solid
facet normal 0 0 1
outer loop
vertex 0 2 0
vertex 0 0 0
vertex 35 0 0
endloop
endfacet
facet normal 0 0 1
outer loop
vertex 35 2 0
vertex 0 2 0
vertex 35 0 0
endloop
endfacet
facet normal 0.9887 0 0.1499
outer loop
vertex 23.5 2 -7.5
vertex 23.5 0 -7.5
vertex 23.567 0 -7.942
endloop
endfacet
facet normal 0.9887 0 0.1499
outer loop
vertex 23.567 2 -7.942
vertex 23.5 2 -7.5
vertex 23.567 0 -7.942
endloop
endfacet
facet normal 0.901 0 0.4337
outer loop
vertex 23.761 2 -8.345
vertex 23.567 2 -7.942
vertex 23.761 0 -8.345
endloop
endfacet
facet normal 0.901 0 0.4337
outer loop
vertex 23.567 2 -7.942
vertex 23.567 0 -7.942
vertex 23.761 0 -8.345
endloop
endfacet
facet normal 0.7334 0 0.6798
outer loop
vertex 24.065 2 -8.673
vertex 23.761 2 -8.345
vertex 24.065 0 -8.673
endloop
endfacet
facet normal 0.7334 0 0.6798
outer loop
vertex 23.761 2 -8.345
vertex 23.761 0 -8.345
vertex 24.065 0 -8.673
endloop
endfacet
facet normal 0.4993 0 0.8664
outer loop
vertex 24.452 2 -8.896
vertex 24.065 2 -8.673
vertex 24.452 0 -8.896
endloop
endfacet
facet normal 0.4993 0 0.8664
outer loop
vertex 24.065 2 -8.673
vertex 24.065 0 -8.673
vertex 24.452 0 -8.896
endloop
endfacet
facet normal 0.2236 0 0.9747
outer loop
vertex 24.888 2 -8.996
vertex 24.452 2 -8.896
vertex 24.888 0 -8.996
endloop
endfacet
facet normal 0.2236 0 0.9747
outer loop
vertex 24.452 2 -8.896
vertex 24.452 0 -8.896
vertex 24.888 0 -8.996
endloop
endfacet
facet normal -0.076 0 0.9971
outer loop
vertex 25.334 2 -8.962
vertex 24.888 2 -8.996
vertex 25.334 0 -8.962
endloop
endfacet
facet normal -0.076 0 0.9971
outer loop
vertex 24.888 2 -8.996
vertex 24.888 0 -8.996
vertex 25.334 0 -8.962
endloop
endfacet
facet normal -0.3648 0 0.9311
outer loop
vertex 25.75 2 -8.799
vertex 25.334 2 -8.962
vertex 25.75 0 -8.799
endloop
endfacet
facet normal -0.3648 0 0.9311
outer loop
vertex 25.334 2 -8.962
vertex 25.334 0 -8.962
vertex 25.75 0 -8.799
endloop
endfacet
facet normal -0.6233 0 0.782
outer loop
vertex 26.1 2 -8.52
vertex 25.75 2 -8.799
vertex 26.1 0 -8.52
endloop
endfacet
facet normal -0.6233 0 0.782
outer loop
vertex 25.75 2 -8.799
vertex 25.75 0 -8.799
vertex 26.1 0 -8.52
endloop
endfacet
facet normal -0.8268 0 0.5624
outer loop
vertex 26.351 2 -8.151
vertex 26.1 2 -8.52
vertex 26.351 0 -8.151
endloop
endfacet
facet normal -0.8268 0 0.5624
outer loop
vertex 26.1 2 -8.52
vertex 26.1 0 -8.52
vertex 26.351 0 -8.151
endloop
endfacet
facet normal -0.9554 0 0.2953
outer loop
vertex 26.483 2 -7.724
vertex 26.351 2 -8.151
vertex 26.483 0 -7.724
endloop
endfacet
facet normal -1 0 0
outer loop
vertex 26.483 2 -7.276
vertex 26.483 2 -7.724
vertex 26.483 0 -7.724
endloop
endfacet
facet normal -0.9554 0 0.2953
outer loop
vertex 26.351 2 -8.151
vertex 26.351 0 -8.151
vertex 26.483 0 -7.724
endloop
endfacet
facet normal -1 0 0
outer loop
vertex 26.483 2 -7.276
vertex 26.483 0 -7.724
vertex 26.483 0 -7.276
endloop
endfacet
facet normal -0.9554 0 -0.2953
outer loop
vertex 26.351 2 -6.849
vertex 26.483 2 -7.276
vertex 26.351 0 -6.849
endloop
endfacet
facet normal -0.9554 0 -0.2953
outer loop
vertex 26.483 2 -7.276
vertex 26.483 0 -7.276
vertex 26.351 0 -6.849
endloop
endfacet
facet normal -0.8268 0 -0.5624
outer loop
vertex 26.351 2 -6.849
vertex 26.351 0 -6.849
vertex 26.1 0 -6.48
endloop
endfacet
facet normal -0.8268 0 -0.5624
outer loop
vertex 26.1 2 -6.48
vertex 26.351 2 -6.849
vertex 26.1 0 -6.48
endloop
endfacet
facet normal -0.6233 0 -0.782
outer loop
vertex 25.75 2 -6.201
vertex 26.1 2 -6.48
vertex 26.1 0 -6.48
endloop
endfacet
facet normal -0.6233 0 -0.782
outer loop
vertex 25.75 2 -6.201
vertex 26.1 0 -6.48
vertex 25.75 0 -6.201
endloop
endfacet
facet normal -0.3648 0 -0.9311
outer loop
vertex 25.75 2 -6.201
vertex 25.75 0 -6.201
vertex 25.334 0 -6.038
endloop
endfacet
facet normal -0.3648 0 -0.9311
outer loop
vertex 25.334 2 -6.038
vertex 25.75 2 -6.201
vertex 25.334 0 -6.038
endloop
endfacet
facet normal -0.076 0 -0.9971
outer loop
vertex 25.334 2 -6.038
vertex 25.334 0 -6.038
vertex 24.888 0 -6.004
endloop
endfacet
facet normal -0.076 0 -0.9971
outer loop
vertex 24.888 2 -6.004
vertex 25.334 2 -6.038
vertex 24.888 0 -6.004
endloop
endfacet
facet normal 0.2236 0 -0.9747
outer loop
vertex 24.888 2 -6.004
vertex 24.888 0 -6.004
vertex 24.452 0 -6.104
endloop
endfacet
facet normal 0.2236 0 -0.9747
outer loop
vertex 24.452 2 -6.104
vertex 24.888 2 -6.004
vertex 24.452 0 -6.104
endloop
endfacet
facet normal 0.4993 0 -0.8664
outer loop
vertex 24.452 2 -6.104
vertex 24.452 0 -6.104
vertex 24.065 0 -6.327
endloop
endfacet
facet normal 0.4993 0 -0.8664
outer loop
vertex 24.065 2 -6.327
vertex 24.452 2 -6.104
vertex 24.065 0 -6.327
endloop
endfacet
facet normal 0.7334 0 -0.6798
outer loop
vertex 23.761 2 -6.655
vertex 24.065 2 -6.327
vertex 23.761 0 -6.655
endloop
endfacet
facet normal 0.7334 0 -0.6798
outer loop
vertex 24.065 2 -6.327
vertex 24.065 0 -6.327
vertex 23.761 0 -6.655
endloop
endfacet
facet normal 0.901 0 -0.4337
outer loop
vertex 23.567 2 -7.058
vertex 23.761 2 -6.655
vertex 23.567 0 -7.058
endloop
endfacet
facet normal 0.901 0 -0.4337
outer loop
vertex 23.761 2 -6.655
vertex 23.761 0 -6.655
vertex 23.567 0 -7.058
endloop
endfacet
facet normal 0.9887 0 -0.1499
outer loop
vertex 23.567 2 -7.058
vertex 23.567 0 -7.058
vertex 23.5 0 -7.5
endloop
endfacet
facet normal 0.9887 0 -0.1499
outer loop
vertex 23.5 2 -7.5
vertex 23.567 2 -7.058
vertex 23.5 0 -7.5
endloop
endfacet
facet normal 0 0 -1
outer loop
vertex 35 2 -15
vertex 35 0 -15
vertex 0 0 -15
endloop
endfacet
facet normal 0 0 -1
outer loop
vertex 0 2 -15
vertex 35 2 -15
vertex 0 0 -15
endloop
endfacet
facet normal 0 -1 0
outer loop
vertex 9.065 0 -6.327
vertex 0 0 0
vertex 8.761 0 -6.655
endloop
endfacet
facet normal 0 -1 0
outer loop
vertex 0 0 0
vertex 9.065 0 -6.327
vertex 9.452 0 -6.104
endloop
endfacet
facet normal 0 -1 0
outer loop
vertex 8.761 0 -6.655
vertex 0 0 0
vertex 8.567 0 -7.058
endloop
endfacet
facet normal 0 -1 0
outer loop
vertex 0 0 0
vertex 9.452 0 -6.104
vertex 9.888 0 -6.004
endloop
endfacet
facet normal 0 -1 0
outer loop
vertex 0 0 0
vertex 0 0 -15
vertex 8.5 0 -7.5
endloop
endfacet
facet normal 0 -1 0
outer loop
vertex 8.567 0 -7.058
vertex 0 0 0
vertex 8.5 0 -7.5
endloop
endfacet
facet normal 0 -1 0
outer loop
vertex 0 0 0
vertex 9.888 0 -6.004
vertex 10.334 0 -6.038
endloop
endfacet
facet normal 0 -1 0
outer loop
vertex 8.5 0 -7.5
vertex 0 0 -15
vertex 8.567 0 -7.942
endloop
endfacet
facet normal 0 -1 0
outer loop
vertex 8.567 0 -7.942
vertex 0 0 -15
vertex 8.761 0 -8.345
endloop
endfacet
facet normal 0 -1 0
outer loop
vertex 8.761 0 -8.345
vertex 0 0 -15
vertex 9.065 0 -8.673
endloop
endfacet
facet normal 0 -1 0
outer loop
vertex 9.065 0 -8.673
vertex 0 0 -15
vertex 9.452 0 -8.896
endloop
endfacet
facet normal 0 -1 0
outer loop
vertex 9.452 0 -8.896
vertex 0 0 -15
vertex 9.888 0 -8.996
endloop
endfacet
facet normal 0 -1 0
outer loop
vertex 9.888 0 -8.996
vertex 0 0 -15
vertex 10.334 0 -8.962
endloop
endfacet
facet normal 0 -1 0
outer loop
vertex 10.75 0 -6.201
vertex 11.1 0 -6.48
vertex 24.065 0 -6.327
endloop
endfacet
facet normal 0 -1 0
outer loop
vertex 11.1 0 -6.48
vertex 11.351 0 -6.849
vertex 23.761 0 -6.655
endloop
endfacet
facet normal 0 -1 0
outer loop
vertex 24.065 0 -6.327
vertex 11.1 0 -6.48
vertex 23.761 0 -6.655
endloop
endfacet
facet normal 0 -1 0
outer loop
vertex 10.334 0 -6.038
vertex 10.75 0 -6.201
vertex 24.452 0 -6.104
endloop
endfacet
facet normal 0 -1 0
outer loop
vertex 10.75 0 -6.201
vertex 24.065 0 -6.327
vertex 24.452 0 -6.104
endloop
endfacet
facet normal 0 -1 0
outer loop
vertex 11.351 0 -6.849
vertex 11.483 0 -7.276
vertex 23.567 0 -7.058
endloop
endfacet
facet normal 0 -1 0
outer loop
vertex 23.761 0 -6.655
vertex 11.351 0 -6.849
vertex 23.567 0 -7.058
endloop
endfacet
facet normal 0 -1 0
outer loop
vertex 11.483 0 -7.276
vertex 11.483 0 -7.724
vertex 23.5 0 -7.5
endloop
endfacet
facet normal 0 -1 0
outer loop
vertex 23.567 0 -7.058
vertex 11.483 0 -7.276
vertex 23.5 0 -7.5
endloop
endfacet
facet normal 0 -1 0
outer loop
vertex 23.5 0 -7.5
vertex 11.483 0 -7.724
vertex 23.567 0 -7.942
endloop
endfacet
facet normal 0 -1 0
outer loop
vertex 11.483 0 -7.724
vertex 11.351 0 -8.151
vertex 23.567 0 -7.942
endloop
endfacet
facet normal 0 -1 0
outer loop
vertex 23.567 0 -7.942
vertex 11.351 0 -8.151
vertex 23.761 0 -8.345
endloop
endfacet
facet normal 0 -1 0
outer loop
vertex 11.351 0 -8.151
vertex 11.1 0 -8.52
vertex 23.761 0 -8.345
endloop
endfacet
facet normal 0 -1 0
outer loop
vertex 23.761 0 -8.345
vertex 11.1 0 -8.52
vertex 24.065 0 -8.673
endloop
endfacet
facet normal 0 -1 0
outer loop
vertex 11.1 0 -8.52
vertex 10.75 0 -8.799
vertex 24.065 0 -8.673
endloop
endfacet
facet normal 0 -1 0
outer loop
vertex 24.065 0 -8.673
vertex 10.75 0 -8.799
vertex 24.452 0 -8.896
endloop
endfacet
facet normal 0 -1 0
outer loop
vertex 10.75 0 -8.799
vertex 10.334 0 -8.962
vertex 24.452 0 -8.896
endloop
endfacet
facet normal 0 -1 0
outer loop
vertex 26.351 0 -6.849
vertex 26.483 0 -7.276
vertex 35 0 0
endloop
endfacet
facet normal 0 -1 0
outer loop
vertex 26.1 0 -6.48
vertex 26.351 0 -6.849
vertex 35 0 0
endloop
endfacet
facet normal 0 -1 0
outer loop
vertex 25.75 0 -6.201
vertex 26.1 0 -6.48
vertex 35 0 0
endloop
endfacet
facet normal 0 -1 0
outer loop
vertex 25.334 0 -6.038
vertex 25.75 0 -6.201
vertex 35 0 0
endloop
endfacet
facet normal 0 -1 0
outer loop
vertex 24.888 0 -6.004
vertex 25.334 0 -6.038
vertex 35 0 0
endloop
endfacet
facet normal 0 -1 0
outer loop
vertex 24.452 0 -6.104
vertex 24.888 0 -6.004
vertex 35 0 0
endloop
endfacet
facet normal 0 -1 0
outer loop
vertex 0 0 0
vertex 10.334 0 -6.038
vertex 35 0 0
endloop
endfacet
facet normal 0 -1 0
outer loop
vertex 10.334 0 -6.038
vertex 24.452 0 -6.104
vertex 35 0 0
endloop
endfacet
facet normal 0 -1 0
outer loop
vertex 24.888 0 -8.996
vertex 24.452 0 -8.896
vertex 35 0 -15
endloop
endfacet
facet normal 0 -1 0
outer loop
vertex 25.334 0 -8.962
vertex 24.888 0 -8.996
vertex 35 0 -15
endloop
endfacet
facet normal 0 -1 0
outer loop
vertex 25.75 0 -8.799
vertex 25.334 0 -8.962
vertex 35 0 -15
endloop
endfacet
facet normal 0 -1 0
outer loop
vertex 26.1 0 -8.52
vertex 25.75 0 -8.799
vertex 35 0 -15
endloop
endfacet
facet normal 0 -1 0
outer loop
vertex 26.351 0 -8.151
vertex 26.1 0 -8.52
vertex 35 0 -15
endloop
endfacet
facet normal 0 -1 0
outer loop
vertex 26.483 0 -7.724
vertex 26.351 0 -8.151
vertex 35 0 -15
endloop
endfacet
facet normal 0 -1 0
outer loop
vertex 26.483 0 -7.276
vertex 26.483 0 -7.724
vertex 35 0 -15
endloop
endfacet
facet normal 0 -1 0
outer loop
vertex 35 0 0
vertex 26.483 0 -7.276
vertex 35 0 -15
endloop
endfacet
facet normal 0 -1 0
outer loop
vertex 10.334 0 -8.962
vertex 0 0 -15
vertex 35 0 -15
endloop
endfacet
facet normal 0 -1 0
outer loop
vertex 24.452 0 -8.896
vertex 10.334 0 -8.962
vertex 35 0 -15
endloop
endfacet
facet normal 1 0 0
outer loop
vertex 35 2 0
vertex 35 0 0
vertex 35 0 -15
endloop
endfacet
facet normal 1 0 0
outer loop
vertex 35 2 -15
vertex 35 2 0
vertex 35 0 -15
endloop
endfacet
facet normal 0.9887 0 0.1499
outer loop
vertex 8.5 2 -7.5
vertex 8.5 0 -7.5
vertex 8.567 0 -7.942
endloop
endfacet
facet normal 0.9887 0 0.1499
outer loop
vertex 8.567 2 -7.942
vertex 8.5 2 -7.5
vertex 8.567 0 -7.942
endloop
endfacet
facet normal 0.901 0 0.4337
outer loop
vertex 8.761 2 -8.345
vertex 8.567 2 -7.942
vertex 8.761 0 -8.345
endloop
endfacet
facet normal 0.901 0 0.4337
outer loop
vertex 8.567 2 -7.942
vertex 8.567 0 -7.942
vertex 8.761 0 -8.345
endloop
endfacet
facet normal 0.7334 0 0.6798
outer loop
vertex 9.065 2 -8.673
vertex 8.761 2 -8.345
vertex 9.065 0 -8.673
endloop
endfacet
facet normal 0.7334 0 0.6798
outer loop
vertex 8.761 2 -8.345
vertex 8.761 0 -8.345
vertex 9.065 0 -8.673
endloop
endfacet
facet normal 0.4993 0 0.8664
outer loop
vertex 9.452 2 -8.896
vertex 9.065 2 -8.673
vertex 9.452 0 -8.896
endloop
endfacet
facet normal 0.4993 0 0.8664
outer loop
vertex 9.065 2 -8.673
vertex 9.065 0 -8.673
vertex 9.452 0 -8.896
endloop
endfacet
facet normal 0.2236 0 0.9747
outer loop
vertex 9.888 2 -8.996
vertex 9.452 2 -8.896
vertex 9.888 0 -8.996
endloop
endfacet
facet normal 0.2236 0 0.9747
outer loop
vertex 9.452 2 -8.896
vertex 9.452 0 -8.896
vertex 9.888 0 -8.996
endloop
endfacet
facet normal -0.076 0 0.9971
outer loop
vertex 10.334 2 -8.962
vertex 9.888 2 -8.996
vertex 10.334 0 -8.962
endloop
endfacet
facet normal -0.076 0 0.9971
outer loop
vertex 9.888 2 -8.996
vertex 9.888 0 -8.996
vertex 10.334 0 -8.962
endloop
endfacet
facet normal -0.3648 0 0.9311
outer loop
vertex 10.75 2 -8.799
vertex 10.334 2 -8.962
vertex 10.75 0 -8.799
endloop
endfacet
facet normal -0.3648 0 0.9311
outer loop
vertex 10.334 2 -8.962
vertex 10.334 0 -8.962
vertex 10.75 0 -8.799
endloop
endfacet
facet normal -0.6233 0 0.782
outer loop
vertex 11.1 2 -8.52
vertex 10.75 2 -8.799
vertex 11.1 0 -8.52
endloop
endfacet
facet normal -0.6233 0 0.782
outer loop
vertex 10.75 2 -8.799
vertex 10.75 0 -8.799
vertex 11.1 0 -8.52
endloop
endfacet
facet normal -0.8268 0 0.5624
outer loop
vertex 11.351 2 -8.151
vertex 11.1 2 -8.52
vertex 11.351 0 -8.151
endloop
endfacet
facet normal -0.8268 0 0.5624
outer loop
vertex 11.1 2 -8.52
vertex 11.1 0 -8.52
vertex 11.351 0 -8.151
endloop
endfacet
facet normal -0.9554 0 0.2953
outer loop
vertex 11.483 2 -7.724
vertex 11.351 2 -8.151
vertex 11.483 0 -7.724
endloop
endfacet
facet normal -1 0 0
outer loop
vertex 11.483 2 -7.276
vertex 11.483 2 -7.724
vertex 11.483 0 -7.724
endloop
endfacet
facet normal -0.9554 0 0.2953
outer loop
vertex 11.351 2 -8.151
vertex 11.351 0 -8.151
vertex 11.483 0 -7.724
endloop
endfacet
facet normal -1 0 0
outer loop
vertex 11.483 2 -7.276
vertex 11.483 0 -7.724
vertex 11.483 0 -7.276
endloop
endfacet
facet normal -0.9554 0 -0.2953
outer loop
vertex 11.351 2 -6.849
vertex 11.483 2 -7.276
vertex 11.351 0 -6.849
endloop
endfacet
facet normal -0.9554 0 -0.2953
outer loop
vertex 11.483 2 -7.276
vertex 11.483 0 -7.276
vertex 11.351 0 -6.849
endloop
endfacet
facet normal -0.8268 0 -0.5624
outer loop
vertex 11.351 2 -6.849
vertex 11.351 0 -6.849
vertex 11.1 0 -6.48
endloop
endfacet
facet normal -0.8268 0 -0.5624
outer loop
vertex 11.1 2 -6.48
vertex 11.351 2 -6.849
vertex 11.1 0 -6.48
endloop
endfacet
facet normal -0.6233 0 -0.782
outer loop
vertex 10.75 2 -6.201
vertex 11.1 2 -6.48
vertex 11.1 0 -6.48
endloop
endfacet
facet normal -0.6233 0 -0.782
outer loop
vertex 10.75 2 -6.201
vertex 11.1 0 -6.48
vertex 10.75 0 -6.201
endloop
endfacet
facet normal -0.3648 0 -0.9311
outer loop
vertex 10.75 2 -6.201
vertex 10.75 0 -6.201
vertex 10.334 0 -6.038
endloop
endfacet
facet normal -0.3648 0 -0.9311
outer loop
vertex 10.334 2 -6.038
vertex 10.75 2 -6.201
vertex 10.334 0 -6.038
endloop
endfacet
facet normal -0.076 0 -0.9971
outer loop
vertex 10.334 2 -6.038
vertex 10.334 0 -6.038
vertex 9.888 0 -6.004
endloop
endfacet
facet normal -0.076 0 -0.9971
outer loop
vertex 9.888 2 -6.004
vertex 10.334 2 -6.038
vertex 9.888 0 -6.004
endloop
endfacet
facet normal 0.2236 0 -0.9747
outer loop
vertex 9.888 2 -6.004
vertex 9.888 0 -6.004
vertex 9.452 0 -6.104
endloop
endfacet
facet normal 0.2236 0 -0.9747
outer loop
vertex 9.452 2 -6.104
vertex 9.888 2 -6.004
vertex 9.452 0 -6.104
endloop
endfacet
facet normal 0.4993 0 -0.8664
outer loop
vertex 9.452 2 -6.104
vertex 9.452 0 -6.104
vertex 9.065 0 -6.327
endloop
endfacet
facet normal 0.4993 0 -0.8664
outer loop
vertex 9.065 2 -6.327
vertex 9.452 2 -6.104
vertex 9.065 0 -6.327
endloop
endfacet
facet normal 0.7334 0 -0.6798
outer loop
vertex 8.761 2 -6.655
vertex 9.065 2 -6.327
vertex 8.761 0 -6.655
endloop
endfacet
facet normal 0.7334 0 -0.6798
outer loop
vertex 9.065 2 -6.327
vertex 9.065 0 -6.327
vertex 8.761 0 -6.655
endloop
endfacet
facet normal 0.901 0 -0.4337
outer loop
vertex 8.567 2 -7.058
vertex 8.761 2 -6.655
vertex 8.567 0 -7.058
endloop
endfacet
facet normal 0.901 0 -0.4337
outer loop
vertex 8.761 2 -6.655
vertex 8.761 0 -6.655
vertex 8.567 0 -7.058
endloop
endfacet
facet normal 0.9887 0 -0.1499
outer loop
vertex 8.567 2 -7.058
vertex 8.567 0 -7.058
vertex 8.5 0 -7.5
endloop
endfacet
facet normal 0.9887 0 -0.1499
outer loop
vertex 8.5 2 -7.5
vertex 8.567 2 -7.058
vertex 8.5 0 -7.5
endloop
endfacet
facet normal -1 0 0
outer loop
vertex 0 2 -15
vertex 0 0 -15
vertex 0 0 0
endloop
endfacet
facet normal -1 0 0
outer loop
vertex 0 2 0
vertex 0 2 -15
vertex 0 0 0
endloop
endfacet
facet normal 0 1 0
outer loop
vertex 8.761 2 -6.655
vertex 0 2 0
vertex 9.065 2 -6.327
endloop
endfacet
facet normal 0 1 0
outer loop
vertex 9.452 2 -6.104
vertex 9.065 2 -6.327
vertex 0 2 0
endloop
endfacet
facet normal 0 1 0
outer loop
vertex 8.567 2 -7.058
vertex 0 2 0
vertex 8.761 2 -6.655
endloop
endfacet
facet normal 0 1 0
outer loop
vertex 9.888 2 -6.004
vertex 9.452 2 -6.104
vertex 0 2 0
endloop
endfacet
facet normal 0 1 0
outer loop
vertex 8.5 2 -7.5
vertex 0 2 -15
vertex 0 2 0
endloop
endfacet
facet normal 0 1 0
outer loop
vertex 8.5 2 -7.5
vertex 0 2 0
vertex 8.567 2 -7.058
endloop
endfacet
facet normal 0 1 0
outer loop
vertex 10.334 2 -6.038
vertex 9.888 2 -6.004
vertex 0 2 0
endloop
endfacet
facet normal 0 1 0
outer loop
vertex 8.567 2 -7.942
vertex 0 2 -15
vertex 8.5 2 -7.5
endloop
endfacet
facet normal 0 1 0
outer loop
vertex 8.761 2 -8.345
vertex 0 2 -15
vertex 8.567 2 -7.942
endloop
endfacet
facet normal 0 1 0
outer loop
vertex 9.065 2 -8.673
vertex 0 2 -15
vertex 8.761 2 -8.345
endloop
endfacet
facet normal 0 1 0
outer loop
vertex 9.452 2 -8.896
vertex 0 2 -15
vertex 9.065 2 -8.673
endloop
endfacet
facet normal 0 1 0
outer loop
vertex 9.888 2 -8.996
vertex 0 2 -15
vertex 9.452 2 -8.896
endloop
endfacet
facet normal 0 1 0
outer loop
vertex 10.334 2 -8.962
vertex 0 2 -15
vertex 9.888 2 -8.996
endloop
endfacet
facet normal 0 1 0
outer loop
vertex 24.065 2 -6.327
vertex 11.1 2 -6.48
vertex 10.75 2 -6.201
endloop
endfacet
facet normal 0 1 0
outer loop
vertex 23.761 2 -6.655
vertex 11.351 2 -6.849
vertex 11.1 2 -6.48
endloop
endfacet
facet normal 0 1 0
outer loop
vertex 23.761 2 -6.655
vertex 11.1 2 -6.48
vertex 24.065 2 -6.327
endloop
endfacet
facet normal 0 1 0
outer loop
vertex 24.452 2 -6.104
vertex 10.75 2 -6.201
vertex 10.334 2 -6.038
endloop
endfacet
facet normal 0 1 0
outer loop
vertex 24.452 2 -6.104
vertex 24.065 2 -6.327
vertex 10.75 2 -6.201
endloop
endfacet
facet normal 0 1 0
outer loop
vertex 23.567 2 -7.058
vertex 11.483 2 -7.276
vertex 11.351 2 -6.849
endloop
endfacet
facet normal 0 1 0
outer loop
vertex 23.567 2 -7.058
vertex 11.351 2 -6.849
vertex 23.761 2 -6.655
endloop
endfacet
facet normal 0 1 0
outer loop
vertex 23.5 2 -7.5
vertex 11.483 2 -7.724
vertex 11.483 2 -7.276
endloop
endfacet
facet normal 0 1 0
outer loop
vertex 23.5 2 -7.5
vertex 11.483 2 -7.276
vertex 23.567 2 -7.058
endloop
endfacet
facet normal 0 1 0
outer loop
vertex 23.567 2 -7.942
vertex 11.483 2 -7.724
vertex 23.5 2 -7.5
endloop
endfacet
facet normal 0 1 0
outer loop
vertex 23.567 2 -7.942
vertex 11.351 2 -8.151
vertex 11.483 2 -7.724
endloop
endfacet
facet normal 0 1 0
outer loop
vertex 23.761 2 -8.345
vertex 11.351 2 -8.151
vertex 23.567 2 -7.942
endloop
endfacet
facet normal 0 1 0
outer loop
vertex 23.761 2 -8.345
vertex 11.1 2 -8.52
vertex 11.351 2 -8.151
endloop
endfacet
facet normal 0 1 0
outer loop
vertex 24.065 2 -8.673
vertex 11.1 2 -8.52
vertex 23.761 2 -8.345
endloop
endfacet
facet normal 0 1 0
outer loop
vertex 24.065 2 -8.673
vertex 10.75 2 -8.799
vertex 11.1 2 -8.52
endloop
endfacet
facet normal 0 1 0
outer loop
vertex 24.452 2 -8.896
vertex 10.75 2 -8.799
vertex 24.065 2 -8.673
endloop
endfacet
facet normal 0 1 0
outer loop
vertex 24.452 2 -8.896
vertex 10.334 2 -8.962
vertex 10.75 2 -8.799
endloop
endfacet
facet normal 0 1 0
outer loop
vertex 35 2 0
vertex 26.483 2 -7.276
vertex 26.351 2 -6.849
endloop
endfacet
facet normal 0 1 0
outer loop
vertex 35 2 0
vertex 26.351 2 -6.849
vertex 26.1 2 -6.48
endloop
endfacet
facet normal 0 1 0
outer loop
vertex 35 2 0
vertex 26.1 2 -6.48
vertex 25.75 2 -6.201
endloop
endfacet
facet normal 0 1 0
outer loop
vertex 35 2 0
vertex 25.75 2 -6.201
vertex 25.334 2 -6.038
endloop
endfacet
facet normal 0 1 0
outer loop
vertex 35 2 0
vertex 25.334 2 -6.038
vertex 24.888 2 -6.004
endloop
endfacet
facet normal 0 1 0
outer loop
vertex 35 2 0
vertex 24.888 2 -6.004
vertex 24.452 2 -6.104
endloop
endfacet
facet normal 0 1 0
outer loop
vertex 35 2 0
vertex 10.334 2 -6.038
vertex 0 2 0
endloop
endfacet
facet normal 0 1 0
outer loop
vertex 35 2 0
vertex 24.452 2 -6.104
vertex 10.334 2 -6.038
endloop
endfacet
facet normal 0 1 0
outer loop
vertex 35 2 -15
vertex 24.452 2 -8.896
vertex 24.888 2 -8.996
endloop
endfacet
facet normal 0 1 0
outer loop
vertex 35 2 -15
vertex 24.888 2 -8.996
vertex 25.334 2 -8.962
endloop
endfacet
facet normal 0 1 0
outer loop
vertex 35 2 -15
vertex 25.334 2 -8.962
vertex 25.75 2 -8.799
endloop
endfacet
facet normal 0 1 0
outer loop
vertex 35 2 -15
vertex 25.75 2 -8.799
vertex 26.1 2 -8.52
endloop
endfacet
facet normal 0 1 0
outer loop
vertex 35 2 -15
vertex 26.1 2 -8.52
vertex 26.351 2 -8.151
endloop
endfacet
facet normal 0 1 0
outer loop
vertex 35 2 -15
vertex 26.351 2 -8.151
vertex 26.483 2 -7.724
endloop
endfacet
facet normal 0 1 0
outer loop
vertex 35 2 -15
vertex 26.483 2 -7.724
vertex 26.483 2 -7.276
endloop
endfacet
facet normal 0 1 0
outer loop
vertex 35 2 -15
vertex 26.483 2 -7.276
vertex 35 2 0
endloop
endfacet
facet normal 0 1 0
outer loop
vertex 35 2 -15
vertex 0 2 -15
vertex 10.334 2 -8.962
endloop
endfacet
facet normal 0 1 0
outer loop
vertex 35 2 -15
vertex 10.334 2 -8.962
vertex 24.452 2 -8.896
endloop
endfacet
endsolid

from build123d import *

# Parameters (mm, degrees)
BOSS_EXTRUDE1_DEPTH = 2


with BuildPart() as part:
    # Sketch1 → Boss-Extrude1 (new body)
    with BuildSketch(Plane(origin=(0, 0, 0), x_dir=(1, 0, 0), z_dir=(0, 1, 0))):
        with BuildLine():
            Line((35, 7.5), (26.5, 7.5))
            ThreePointArc((26.5, 7.5), (25, 6), (23.5, 7.5))
            Line((23.5, 7.5), (11.5, 7.5))
            ThreePointArc((11.5, 7.5), (10, 6), (8.5, 7.5))
            Line((8.5, 7.5), (0, 7.5))
            Line((0, 7.5), (0, 0))
            Line((0, 0), (35, 0))
            Line((35, 0), (35, 7.5))
        make_face()
        with BuildLine():
            ThreePointArc((23.5, 7.5), (25, 9), (26.5, 7.5))
            Line((26.5, 7.5), (35, 7.5))
            Line((35, 7.5), (35, 15))
            Line((35, 15), (0, 15))
            Line((0, 15), (0, 7.5))
            Line((0, 7.5), (8.5, 7.5))
            ThreePointArc((8.5, 7.5), (10, 9), (11.5, 7.5))
            Line((11.5, 7.5), (23.5, 7.5))
        make_face()
    extrude(amount=BOSS_EXTRUDE1_DEPTH)


solid = part.part
